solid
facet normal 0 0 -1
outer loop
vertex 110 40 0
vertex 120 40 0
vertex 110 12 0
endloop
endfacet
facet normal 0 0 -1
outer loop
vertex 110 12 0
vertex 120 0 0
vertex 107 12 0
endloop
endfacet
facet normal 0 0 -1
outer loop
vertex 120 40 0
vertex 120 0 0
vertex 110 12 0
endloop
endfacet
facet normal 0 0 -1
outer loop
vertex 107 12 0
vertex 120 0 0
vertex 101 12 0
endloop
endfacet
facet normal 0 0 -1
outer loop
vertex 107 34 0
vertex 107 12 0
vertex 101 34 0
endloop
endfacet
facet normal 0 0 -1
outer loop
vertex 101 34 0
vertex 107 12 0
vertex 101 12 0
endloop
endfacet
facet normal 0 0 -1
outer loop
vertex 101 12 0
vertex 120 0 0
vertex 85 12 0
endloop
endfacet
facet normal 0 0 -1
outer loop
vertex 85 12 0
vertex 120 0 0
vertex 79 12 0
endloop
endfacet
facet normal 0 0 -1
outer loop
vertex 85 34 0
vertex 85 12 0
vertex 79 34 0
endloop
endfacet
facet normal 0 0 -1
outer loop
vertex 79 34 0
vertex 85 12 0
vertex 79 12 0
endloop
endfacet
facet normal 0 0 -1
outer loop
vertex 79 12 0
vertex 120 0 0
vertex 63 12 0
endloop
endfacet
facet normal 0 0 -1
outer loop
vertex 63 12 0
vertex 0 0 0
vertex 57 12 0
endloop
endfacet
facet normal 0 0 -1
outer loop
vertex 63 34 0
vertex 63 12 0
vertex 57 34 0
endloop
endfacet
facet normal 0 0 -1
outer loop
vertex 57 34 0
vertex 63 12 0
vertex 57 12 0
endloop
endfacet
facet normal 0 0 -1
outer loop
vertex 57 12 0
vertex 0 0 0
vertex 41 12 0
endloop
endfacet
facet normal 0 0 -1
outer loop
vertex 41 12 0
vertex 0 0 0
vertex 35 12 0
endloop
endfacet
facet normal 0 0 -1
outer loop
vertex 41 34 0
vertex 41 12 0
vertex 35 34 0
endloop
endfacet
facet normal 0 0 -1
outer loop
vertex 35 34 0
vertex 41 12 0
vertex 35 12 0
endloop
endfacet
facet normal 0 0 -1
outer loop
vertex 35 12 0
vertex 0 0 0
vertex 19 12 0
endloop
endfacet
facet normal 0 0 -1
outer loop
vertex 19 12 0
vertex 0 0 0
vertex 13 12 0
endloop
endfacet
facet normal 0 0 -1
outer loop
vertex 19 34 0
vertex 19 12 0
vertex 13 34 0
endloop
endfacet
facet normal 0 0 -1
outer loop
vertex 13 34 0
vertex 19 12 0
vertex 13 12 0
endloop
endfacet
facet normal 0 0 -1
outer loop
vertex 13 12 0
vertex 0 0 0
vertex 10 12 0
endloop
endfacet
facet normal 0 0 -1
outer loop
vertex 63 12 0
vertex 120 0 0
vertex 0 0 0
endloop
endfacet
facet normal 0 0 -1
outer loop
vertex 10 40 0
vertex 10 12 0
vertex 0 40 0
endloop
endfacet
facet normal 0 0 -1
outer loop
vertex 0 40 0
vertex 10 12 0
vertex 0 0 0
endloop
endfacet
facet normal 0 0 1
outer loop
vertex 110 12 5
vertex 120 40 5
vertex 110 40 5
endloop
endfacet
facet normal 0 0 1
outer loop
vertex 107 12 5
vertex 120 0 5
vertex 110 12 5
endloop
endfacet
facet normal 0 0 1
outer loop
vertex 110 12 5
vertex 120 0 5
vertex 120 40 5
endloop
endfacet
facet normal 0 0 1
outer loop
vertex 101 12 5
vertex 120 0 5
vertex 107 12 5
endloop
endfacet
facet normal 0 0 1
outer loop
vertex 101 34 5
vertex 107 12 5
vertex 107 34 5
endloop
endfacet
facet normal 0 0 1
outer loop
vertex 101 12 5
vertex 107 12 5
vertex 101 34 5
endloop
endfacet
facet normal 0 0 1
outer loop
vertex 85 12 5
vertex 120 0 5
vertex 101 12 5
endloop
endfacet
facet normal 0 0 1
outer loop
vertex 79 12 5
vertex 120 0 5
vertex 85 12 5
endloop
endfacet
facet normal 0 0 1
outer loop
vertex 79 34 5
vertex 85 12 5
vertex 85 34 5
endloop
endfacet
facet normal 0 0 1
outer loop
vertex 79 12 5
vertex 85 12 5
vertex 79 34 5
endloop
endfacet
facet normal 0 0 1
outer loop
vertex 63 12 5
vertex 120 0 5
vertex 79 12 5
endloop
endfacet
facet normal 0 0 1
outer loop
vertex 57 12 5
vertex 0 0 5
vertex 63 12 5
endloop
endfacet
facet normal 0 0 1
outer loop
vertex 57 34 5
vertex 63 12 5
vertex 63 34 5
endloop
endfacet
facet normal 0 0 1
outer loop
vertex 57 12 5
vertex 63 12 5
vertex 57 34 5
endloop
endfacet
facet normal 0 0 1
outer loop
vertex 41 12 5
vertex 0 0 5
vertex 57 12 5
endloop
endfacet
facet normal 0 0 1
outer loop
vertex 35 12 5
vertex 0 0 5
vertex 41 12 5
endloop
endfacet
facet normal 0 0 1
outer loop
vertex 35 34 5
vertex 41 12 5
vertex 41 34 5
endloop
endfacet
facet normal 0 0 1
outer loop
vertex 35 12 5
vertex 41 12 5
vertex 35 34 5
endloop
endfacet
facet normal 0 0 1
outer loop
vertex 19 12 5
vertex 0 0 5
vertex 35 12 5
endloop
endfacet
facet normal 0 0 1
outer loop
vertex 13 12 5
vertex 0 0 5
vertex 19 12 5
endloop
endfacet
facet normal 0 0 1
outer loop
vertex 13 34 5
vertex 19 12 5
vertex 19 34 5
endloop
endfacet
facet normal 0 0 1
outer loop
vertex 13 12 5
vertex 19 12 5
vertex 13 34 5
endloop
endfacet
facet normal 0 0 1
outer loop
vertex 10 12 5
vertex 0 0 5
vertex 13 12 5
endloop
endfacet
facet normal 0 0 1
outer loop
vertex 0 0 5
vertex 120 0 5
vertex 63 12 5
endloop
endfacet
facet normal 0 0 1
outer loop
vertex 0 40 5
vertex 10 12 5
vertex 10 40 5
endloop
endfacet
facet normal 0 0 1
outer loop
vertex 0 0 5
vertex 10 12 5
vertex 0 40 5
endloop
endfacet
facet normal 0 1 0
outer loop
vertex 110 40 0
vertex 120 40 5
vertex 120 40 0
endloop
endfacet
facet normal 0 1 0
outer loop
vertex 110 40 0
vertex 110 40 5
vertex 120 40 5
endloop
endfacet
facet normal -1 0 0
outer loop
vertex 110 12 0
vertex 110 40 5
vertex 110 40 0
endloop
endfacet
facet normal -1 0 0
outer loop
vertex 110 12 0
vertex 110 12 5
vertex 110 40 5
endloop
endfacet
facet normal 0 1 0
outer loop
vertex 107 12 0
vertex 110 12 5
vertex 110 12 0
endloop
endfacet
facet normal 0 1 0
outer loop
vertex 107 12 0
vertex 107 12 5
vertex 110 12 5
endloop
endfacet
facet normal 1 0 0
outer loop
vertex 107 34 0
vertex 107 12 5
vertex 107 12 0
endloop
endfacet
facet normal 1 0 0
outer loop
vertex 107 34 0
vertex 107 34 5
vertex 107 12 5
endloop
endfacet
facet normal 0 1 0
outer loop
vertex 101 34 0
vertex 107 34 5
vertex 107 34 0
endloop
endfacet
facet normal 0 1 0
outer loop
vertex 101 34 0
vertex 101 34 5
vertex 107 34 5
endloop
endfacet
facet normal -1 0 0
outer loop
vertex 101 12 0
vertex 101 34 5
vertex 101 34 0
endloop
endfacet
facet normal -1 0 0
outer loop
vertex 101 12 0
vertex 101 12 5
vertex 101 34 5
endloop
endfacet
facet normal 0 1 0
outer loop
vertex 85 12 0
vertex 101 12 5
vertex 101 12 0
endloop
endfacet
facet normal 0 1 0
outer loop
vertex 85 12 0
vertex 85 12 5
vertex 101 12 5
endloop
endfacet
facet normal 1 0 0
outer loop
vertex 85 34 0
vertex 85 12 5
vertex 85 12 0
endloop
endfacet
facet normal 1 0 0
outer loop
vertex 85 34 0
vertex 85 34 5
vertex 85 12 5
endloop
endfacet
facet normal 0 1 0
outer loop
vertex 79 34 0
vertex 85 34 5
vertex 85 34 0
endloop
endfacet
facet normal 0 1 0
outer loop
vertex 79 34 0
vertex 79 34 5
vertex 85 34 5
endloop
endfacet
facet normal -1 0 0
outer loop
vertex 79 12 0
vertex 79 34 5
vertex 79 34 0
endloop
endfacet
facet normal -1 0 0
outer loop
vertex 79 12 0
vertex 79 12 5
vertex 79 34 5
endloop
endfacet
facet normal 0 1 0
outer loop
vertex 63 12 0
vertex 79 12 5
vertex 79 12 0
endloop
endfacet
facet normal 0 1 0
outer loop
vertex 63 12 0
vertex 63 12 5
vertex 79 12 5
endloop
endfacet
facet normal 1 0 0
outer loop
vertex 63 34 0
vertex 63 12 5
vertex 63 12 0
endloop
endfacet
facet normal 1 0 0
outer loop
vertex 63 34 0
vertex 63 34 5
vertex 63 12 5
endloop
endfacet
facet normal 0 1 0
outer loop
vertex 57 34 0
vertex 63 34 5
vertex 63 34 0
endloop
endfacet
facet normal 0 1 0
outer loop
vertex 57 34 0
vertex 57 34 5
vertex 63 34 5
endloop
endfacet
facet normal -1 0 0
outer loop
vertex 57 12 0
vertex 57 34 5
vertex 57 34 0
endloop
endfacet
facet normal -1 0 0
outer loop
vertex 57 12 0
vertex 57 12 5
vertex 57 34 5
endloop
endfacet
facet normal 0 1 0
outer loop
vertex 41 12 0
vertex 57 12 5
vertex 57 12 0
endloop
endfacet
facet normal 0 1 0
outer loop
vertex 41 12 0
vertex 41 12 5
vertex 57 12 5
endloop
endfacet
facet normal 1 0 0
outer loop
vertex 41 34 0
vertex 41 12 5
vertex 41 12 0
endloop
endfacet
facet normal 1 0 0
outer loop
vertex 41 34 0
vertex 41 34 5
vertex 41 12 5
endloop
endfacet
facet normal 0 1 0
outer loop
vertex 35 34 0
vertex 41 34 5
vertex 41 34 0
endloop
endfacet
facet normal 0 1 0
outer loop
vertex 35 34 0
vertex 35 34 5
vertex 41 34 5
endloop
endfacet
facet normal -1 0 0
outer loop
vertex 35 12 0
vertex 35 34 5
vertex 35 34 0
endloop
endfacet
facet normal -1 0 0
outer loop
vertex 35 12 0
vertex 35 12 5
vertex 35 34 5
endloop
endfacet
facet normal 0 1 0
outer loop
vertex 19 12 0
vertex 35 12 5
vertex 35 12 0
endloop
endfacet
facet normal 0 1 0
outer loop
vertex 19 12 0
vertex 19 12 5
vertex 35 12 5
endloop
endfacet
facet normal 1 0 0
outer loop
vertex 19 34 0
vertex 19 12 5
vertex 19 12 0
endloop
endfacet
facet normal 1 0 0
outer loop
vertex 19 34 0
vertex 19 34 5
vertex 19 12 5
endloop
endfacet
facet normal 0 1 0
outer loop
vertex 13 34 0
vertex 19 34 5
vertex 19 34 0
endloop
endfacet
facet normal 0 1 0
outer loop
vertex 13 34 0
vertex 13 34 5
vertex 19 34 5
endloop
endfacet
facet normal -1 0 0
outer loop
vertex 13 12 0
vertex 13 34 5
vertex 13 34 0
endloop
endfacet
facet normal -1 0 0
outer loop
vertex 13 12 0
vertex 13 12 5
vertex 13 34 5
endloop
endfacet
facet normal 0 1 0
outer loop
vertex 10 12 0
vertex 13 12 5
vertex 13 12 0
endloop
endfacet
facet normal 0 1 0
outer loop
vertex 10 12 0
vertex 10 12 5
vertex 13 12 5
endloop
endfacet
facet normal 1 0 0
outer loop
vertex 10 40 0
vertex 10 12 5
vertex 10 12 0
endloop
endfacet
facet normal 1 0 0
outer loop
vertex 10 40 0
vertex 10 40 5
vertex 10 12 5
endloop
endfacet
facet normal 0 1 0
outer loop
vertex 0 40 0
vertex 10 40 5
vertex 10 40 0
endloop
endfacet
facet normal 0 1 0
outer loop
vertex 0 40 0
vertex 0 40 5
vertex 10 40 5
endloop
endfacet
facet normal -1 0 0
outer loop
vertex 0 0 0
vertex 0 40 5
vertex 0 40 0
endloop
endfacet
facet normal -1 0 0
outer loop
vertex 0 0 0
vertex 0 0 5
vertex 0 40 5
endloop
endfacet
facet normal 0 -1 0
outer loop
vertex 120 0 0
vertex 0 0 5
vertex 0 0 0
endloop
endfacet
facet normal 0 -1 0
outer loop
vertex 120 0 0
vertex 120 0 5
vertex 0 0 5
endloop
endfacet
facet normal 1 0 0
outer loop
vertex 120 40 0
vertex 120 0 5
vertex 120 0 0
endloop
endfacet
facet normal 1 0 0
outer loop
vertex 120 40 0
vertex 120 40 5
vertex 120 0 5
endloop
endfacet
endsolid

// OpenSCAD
$fn = 32;

// ----------------------------------------------------------------------
// Guard grille: 5 slats over a 120 x 40 mm plate
// ----------------------------------------------------------------------

// --- parameters (mm) ---
profile_height = 5;       // extrusion height
profile_points = 28;      // points of the closed outline

profile = [[0, 0], [120, 0], [120, 40], [110, 40], [110, 12], [107, 12], [107, 34], [101, 34], [101, 12], [85, 12], [85, 34], [79, 34], [79, 12], [63, 12], [63, 34], [57, 34], [57, 12], [41, 12], [41, 34], [35, 34], [35, 12], [19, 12], [19, 34], [13, 34], [13, 12], [10, 12], [10, 40], [0, 40]];  // single closed polygon, 28 points, counter clockwise

// --- the one profile operation ---
linear_extrude(height = profile_height) polygon(points = profile);
